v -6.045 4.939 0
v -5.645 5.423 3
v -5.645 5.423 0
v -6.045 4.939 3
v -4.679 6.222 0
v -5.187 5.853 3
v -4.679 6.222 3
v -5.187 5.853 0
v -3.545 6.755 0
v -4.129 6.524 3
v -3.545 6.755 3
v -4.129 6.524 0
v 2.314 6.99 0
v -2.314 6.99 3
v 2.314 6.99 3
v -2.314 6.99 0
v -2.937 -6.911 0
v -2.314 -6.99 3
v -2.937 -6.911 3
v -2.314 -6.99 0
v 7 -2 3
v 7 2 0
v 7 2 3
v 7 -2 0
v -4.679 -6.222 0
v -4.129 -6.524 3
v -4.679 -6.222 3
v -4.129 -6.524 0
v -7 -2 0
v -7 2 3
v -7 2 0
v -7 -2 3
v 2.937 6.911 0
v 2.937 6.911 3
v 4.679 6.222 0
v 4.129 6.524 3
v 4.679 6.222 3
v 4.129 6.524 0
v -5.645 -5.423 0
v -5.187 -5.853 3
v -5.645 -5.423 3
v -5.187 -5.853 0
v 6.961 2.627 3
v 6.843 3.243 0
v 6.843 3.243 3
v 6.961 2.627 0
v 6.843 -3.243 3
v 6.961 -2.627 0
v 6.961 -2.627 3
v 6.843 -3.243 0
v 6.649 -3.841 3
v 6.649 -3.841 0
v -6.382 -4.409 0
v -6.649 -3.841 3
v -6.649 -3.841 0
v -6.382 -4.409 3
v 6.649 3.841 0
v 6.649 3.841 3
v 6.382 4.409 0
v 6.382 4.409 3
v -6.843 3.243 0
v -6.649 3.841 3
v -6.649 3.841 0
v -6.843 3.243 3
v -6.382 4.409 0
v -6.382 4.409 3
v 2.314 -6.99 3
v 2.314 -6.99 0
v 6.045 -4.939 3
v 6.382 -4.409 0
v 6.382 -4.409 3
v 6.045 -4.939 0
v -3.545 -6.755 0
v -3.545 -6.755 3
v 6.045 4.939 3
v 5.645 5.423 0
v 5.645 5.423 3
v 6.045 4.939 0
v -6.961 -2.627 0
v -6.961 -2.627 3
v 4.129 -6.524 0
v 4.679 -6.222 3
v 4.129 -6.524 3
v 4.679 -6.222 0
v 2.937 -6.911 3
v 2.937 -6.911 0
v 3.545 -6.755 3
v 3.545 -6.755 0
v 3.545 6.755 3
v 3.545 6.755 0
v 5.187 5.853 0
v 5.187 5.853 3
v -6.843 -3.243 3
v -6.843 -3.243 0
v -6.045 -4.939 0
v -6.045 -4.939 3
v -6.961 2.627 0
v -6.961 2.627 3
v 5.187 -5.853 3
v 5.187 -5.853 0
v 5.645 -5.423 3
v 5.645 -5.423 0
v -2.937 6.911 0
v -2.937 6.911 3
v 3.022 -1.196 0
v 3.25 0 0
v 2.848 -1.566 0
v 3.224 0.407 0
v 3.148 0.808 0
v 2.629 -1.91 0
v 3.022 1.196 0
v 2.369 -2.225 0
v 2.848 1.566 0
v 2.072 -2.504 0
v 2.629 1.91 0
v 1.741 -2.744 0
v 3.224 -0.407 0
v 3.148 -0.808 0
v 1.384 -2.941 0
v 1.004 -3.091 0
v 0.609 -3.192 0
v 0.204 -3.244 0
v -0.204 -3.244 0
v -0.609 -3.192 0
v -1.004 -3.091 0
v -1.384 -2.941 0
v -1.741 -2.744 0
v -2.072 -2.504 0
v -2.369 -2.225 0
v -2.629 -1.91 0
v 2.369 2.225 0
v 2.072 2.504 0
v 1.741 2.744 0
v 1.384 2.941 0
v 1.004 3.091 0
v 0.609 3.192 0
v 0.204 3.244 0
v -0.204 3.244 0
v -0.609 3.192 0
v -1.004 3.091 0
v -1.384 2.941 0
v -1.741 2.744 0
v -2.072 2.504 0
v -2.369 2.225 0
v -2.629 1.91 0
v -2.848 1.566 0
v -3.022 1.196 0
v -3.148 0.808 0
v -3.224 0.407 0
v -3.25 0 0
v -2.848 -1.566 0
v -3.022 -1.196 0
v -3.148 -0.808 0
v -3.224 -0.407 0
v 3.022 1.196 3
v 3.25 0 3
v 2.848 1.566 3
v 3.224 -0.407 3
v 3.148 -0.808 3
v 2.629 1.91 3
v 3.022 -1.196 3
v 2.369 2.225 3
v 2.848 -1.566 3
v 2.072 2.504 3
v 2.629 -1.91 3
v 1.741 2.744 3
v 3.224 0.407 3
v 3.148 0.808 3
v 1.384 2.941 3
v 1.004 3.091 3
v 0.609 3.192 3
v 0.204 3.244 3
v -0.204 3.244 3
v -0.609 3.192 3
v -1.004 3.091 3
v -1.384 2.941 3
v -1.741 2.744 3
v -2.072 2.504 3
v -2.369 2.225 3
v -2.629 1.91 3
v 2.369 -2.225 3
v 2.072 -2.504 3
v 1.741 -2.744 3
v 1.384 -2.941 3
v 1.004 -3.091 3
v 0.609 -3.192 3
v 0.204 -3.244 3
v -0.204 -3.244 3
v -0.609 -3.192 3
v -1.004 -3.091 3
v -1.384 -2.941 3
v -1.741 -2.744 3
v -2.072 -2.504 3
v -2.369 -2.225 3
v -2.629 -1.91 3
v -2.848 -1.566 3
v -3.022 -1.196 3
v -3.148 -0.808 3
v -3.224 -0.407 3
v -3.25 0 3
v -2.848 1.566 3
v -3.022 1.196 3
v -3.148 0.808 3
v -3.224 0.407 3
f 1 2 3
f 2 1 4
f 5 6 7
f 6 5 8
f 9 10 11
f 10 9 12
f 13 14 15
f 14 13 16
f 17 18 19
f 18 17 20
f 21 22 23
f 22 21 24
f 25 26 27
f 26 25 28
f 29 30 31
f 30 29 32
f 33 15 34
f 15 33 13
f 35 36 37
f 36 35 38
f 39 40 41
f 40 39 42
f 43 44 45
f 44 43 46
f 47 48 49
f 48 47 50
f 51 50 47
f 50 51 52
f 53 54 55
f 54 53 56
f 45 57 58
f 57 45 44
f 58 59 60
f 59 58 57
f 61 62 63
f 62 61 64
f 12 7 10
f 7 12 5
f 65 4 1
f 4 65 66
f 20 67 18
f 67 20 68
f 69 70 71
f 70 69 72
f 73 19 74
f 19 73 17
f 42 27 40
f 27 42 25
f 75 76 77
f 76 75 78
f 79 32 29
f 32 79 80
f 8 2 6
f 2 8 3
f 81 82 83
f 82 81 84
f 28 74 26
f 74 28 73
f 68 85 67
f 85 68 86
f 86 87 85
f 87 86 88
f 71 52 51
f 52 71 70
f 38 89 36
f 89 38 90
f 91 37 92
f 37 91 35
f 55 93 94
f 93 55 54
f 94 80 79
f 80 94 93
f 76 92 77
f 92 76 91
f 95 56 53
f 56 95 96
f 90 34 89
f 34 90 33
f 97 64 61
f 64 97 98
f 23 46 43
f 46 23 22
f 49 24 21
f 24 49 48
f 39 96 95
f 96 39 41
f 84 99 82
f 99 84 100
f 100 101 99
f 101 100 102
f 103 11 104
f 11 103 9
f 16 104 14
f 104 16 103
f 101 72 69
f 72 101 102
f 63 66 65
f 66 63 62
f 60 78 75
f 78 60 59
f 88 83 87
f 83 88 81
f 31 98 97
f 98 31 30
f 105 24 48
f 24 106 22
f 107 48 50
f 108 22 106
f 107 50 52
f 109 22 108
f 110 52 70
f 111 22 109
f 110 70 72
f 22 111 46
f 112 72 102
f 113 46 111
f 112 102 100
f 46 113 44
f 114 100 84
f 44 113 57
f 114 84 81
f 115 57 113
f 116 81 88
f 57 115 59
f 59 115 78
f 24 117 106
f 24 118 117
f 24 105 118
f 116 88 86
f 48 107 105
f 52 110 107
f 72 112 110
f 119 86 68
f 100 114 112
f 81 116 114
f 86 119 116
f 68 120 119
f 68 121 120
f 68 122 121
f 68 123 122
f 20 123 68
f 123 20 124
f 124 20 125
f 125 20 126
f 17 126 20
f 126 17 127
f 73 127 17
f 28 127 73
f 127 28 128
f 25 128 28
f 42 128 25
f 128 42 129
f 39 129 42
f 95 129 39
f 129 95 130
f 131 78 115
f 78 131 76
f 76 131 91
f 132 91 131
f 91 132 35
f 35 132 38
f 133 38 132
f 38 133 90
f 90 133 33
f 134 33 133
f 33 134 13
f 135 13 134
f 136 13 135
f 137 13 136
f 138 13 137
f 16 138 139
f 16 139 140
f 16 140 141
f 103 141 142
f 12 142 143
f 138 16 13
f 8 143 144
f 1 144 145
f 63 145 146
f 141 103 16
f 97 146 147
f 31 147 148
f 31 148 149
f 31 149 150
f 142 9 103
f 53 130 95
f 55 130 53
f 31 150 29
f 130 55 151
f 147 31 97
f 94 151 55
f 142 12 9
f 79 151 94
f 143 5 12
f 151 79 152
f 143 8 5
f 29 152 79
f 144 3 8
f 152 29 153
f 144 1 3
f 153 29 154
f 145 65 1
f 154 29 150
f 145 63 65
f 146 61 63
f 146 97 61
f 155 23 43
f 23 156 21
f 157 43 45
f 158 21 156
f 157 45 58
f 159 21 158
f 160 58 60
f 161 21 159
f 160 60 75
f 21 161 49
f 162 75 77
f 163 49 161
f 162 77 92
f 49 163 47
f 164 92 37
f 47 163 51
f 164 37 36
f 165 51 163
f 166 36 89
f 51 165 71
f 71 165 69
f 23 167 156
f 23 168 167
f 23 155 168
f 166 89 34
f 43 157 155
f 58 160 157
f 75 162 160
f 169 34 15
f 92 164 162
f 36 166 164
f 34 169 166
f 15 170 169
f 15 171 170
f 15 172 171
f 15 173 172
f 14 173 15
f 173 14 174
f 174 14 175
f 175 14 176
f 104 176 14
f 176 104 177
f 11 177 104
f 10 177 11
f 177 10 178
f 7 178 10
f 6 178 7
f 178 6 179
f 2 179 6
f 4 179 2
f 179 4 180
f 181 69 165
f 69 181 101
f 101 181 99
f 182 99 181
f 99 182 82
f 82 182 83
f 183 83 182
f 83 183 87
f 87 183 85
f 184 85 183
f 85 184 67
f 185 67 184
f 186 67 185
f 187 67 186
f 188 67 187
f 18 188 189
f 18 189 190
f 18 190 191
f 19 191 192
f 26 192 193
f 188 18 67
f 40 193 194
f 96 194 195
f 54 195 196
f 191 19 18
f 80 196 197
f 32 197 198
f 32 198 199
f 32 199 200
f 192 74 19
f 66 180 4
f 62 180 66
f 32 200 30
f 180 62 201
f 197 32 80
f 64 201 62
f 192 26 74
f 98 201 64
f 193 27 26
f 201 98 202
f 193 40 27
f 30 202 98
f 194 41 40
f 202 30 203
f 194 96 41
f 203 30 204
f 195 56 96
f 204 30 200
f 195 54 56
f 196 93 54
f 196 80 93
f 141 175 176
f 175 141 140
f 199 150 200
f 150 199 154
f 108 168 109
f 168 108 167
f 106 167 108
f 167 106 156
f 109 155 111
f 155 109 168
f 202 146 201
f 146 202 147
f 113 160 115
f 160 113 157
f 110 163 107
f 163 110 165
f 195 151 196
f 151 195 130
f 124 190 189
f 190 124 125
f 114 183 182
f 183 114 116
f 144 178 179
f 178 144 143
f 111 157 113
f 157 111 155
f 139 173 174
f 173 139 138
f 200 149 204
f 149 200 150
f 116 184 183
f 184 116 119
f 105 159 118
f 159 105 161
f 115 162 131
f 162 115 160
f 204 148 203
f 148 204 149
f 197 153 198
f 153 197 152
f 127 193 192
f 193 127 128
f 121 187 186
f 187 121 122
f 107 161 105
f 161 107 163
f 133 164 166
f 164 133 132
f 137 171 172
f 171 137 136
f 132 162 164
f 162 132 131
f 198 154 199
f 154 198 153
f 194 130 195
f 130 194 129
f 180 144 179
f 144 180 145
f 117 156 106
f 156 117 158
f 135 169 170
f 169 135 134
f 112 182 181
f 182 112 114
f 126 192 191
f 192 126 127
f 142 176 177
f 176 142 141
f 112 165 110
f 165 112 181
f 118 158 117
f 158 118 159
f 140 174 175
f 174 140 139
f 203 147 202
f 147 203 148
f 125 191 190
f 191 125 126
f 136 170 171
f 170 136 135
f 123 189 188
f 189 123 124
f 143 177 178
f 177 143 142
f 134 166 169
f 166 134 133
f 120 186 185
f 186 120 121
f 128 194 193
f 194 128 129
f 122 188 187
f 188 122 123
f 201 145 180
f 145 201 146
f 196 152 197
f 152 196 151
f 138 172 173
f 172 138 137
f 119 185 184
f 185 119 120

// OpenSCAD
$fn = 50;


difference() {
	union() {
		translate(v = [0, 0, 0]) {
			rotate(a = [0, 0, 0]) {
				hull() {
					translate(v = [-2.0000000000, 2.0000000000, 0]) {
						rotate(a = [0, 0, 0]) {
							translate(v = [0, 0, 0]) {
								rotate(a = [0, 0, 0]) {
									cylinder(h = 3, r = 5);
								}
							}
						}
					}
					translate(v = [2.0000000000, 2.0000000000, 0]) {
						rotate(a = [0, 0, 0]) {
							translate(v = [0, 0, 0]) {
								rotate(a = [0, 0, 0]) {
									cylinder(h = 3, r = 5);
								}
							}
						}
					}
					translate(v = [-2.0000000000, -2.0000000000, 0]) {
						rotate(a = [0, 0, 0]) {
							translate(v = [0, 0, 0]) {
								rotate(a = [0, 0, 0]) {
									cylinder(h = 3, r = 5);
								}
							}
						}
					}
					translate(v = [2.0000000000, -2.0000000000, 0]) {
						rotate(a = [0, 0, 0]) {
							translate(v = [0, 0, 0]) {
								rotate(a = [0, 0, 0]) {
									cylinder(h = 3, r = 5);
								}
							}
						}
					}
				}
			}
		}
	}
	union() {
		translate(v = [0.0000000000, 0.0000000000, 0]) {
			rotate(a = [0, 0, 0]) {
				translate(v = [0, 0, -50]) {
					rotate(a = [0, 0, 0]) {
						cylinder(h = 100, r = 3.2500000000);
					}
				}
			}
		}
	}
}
